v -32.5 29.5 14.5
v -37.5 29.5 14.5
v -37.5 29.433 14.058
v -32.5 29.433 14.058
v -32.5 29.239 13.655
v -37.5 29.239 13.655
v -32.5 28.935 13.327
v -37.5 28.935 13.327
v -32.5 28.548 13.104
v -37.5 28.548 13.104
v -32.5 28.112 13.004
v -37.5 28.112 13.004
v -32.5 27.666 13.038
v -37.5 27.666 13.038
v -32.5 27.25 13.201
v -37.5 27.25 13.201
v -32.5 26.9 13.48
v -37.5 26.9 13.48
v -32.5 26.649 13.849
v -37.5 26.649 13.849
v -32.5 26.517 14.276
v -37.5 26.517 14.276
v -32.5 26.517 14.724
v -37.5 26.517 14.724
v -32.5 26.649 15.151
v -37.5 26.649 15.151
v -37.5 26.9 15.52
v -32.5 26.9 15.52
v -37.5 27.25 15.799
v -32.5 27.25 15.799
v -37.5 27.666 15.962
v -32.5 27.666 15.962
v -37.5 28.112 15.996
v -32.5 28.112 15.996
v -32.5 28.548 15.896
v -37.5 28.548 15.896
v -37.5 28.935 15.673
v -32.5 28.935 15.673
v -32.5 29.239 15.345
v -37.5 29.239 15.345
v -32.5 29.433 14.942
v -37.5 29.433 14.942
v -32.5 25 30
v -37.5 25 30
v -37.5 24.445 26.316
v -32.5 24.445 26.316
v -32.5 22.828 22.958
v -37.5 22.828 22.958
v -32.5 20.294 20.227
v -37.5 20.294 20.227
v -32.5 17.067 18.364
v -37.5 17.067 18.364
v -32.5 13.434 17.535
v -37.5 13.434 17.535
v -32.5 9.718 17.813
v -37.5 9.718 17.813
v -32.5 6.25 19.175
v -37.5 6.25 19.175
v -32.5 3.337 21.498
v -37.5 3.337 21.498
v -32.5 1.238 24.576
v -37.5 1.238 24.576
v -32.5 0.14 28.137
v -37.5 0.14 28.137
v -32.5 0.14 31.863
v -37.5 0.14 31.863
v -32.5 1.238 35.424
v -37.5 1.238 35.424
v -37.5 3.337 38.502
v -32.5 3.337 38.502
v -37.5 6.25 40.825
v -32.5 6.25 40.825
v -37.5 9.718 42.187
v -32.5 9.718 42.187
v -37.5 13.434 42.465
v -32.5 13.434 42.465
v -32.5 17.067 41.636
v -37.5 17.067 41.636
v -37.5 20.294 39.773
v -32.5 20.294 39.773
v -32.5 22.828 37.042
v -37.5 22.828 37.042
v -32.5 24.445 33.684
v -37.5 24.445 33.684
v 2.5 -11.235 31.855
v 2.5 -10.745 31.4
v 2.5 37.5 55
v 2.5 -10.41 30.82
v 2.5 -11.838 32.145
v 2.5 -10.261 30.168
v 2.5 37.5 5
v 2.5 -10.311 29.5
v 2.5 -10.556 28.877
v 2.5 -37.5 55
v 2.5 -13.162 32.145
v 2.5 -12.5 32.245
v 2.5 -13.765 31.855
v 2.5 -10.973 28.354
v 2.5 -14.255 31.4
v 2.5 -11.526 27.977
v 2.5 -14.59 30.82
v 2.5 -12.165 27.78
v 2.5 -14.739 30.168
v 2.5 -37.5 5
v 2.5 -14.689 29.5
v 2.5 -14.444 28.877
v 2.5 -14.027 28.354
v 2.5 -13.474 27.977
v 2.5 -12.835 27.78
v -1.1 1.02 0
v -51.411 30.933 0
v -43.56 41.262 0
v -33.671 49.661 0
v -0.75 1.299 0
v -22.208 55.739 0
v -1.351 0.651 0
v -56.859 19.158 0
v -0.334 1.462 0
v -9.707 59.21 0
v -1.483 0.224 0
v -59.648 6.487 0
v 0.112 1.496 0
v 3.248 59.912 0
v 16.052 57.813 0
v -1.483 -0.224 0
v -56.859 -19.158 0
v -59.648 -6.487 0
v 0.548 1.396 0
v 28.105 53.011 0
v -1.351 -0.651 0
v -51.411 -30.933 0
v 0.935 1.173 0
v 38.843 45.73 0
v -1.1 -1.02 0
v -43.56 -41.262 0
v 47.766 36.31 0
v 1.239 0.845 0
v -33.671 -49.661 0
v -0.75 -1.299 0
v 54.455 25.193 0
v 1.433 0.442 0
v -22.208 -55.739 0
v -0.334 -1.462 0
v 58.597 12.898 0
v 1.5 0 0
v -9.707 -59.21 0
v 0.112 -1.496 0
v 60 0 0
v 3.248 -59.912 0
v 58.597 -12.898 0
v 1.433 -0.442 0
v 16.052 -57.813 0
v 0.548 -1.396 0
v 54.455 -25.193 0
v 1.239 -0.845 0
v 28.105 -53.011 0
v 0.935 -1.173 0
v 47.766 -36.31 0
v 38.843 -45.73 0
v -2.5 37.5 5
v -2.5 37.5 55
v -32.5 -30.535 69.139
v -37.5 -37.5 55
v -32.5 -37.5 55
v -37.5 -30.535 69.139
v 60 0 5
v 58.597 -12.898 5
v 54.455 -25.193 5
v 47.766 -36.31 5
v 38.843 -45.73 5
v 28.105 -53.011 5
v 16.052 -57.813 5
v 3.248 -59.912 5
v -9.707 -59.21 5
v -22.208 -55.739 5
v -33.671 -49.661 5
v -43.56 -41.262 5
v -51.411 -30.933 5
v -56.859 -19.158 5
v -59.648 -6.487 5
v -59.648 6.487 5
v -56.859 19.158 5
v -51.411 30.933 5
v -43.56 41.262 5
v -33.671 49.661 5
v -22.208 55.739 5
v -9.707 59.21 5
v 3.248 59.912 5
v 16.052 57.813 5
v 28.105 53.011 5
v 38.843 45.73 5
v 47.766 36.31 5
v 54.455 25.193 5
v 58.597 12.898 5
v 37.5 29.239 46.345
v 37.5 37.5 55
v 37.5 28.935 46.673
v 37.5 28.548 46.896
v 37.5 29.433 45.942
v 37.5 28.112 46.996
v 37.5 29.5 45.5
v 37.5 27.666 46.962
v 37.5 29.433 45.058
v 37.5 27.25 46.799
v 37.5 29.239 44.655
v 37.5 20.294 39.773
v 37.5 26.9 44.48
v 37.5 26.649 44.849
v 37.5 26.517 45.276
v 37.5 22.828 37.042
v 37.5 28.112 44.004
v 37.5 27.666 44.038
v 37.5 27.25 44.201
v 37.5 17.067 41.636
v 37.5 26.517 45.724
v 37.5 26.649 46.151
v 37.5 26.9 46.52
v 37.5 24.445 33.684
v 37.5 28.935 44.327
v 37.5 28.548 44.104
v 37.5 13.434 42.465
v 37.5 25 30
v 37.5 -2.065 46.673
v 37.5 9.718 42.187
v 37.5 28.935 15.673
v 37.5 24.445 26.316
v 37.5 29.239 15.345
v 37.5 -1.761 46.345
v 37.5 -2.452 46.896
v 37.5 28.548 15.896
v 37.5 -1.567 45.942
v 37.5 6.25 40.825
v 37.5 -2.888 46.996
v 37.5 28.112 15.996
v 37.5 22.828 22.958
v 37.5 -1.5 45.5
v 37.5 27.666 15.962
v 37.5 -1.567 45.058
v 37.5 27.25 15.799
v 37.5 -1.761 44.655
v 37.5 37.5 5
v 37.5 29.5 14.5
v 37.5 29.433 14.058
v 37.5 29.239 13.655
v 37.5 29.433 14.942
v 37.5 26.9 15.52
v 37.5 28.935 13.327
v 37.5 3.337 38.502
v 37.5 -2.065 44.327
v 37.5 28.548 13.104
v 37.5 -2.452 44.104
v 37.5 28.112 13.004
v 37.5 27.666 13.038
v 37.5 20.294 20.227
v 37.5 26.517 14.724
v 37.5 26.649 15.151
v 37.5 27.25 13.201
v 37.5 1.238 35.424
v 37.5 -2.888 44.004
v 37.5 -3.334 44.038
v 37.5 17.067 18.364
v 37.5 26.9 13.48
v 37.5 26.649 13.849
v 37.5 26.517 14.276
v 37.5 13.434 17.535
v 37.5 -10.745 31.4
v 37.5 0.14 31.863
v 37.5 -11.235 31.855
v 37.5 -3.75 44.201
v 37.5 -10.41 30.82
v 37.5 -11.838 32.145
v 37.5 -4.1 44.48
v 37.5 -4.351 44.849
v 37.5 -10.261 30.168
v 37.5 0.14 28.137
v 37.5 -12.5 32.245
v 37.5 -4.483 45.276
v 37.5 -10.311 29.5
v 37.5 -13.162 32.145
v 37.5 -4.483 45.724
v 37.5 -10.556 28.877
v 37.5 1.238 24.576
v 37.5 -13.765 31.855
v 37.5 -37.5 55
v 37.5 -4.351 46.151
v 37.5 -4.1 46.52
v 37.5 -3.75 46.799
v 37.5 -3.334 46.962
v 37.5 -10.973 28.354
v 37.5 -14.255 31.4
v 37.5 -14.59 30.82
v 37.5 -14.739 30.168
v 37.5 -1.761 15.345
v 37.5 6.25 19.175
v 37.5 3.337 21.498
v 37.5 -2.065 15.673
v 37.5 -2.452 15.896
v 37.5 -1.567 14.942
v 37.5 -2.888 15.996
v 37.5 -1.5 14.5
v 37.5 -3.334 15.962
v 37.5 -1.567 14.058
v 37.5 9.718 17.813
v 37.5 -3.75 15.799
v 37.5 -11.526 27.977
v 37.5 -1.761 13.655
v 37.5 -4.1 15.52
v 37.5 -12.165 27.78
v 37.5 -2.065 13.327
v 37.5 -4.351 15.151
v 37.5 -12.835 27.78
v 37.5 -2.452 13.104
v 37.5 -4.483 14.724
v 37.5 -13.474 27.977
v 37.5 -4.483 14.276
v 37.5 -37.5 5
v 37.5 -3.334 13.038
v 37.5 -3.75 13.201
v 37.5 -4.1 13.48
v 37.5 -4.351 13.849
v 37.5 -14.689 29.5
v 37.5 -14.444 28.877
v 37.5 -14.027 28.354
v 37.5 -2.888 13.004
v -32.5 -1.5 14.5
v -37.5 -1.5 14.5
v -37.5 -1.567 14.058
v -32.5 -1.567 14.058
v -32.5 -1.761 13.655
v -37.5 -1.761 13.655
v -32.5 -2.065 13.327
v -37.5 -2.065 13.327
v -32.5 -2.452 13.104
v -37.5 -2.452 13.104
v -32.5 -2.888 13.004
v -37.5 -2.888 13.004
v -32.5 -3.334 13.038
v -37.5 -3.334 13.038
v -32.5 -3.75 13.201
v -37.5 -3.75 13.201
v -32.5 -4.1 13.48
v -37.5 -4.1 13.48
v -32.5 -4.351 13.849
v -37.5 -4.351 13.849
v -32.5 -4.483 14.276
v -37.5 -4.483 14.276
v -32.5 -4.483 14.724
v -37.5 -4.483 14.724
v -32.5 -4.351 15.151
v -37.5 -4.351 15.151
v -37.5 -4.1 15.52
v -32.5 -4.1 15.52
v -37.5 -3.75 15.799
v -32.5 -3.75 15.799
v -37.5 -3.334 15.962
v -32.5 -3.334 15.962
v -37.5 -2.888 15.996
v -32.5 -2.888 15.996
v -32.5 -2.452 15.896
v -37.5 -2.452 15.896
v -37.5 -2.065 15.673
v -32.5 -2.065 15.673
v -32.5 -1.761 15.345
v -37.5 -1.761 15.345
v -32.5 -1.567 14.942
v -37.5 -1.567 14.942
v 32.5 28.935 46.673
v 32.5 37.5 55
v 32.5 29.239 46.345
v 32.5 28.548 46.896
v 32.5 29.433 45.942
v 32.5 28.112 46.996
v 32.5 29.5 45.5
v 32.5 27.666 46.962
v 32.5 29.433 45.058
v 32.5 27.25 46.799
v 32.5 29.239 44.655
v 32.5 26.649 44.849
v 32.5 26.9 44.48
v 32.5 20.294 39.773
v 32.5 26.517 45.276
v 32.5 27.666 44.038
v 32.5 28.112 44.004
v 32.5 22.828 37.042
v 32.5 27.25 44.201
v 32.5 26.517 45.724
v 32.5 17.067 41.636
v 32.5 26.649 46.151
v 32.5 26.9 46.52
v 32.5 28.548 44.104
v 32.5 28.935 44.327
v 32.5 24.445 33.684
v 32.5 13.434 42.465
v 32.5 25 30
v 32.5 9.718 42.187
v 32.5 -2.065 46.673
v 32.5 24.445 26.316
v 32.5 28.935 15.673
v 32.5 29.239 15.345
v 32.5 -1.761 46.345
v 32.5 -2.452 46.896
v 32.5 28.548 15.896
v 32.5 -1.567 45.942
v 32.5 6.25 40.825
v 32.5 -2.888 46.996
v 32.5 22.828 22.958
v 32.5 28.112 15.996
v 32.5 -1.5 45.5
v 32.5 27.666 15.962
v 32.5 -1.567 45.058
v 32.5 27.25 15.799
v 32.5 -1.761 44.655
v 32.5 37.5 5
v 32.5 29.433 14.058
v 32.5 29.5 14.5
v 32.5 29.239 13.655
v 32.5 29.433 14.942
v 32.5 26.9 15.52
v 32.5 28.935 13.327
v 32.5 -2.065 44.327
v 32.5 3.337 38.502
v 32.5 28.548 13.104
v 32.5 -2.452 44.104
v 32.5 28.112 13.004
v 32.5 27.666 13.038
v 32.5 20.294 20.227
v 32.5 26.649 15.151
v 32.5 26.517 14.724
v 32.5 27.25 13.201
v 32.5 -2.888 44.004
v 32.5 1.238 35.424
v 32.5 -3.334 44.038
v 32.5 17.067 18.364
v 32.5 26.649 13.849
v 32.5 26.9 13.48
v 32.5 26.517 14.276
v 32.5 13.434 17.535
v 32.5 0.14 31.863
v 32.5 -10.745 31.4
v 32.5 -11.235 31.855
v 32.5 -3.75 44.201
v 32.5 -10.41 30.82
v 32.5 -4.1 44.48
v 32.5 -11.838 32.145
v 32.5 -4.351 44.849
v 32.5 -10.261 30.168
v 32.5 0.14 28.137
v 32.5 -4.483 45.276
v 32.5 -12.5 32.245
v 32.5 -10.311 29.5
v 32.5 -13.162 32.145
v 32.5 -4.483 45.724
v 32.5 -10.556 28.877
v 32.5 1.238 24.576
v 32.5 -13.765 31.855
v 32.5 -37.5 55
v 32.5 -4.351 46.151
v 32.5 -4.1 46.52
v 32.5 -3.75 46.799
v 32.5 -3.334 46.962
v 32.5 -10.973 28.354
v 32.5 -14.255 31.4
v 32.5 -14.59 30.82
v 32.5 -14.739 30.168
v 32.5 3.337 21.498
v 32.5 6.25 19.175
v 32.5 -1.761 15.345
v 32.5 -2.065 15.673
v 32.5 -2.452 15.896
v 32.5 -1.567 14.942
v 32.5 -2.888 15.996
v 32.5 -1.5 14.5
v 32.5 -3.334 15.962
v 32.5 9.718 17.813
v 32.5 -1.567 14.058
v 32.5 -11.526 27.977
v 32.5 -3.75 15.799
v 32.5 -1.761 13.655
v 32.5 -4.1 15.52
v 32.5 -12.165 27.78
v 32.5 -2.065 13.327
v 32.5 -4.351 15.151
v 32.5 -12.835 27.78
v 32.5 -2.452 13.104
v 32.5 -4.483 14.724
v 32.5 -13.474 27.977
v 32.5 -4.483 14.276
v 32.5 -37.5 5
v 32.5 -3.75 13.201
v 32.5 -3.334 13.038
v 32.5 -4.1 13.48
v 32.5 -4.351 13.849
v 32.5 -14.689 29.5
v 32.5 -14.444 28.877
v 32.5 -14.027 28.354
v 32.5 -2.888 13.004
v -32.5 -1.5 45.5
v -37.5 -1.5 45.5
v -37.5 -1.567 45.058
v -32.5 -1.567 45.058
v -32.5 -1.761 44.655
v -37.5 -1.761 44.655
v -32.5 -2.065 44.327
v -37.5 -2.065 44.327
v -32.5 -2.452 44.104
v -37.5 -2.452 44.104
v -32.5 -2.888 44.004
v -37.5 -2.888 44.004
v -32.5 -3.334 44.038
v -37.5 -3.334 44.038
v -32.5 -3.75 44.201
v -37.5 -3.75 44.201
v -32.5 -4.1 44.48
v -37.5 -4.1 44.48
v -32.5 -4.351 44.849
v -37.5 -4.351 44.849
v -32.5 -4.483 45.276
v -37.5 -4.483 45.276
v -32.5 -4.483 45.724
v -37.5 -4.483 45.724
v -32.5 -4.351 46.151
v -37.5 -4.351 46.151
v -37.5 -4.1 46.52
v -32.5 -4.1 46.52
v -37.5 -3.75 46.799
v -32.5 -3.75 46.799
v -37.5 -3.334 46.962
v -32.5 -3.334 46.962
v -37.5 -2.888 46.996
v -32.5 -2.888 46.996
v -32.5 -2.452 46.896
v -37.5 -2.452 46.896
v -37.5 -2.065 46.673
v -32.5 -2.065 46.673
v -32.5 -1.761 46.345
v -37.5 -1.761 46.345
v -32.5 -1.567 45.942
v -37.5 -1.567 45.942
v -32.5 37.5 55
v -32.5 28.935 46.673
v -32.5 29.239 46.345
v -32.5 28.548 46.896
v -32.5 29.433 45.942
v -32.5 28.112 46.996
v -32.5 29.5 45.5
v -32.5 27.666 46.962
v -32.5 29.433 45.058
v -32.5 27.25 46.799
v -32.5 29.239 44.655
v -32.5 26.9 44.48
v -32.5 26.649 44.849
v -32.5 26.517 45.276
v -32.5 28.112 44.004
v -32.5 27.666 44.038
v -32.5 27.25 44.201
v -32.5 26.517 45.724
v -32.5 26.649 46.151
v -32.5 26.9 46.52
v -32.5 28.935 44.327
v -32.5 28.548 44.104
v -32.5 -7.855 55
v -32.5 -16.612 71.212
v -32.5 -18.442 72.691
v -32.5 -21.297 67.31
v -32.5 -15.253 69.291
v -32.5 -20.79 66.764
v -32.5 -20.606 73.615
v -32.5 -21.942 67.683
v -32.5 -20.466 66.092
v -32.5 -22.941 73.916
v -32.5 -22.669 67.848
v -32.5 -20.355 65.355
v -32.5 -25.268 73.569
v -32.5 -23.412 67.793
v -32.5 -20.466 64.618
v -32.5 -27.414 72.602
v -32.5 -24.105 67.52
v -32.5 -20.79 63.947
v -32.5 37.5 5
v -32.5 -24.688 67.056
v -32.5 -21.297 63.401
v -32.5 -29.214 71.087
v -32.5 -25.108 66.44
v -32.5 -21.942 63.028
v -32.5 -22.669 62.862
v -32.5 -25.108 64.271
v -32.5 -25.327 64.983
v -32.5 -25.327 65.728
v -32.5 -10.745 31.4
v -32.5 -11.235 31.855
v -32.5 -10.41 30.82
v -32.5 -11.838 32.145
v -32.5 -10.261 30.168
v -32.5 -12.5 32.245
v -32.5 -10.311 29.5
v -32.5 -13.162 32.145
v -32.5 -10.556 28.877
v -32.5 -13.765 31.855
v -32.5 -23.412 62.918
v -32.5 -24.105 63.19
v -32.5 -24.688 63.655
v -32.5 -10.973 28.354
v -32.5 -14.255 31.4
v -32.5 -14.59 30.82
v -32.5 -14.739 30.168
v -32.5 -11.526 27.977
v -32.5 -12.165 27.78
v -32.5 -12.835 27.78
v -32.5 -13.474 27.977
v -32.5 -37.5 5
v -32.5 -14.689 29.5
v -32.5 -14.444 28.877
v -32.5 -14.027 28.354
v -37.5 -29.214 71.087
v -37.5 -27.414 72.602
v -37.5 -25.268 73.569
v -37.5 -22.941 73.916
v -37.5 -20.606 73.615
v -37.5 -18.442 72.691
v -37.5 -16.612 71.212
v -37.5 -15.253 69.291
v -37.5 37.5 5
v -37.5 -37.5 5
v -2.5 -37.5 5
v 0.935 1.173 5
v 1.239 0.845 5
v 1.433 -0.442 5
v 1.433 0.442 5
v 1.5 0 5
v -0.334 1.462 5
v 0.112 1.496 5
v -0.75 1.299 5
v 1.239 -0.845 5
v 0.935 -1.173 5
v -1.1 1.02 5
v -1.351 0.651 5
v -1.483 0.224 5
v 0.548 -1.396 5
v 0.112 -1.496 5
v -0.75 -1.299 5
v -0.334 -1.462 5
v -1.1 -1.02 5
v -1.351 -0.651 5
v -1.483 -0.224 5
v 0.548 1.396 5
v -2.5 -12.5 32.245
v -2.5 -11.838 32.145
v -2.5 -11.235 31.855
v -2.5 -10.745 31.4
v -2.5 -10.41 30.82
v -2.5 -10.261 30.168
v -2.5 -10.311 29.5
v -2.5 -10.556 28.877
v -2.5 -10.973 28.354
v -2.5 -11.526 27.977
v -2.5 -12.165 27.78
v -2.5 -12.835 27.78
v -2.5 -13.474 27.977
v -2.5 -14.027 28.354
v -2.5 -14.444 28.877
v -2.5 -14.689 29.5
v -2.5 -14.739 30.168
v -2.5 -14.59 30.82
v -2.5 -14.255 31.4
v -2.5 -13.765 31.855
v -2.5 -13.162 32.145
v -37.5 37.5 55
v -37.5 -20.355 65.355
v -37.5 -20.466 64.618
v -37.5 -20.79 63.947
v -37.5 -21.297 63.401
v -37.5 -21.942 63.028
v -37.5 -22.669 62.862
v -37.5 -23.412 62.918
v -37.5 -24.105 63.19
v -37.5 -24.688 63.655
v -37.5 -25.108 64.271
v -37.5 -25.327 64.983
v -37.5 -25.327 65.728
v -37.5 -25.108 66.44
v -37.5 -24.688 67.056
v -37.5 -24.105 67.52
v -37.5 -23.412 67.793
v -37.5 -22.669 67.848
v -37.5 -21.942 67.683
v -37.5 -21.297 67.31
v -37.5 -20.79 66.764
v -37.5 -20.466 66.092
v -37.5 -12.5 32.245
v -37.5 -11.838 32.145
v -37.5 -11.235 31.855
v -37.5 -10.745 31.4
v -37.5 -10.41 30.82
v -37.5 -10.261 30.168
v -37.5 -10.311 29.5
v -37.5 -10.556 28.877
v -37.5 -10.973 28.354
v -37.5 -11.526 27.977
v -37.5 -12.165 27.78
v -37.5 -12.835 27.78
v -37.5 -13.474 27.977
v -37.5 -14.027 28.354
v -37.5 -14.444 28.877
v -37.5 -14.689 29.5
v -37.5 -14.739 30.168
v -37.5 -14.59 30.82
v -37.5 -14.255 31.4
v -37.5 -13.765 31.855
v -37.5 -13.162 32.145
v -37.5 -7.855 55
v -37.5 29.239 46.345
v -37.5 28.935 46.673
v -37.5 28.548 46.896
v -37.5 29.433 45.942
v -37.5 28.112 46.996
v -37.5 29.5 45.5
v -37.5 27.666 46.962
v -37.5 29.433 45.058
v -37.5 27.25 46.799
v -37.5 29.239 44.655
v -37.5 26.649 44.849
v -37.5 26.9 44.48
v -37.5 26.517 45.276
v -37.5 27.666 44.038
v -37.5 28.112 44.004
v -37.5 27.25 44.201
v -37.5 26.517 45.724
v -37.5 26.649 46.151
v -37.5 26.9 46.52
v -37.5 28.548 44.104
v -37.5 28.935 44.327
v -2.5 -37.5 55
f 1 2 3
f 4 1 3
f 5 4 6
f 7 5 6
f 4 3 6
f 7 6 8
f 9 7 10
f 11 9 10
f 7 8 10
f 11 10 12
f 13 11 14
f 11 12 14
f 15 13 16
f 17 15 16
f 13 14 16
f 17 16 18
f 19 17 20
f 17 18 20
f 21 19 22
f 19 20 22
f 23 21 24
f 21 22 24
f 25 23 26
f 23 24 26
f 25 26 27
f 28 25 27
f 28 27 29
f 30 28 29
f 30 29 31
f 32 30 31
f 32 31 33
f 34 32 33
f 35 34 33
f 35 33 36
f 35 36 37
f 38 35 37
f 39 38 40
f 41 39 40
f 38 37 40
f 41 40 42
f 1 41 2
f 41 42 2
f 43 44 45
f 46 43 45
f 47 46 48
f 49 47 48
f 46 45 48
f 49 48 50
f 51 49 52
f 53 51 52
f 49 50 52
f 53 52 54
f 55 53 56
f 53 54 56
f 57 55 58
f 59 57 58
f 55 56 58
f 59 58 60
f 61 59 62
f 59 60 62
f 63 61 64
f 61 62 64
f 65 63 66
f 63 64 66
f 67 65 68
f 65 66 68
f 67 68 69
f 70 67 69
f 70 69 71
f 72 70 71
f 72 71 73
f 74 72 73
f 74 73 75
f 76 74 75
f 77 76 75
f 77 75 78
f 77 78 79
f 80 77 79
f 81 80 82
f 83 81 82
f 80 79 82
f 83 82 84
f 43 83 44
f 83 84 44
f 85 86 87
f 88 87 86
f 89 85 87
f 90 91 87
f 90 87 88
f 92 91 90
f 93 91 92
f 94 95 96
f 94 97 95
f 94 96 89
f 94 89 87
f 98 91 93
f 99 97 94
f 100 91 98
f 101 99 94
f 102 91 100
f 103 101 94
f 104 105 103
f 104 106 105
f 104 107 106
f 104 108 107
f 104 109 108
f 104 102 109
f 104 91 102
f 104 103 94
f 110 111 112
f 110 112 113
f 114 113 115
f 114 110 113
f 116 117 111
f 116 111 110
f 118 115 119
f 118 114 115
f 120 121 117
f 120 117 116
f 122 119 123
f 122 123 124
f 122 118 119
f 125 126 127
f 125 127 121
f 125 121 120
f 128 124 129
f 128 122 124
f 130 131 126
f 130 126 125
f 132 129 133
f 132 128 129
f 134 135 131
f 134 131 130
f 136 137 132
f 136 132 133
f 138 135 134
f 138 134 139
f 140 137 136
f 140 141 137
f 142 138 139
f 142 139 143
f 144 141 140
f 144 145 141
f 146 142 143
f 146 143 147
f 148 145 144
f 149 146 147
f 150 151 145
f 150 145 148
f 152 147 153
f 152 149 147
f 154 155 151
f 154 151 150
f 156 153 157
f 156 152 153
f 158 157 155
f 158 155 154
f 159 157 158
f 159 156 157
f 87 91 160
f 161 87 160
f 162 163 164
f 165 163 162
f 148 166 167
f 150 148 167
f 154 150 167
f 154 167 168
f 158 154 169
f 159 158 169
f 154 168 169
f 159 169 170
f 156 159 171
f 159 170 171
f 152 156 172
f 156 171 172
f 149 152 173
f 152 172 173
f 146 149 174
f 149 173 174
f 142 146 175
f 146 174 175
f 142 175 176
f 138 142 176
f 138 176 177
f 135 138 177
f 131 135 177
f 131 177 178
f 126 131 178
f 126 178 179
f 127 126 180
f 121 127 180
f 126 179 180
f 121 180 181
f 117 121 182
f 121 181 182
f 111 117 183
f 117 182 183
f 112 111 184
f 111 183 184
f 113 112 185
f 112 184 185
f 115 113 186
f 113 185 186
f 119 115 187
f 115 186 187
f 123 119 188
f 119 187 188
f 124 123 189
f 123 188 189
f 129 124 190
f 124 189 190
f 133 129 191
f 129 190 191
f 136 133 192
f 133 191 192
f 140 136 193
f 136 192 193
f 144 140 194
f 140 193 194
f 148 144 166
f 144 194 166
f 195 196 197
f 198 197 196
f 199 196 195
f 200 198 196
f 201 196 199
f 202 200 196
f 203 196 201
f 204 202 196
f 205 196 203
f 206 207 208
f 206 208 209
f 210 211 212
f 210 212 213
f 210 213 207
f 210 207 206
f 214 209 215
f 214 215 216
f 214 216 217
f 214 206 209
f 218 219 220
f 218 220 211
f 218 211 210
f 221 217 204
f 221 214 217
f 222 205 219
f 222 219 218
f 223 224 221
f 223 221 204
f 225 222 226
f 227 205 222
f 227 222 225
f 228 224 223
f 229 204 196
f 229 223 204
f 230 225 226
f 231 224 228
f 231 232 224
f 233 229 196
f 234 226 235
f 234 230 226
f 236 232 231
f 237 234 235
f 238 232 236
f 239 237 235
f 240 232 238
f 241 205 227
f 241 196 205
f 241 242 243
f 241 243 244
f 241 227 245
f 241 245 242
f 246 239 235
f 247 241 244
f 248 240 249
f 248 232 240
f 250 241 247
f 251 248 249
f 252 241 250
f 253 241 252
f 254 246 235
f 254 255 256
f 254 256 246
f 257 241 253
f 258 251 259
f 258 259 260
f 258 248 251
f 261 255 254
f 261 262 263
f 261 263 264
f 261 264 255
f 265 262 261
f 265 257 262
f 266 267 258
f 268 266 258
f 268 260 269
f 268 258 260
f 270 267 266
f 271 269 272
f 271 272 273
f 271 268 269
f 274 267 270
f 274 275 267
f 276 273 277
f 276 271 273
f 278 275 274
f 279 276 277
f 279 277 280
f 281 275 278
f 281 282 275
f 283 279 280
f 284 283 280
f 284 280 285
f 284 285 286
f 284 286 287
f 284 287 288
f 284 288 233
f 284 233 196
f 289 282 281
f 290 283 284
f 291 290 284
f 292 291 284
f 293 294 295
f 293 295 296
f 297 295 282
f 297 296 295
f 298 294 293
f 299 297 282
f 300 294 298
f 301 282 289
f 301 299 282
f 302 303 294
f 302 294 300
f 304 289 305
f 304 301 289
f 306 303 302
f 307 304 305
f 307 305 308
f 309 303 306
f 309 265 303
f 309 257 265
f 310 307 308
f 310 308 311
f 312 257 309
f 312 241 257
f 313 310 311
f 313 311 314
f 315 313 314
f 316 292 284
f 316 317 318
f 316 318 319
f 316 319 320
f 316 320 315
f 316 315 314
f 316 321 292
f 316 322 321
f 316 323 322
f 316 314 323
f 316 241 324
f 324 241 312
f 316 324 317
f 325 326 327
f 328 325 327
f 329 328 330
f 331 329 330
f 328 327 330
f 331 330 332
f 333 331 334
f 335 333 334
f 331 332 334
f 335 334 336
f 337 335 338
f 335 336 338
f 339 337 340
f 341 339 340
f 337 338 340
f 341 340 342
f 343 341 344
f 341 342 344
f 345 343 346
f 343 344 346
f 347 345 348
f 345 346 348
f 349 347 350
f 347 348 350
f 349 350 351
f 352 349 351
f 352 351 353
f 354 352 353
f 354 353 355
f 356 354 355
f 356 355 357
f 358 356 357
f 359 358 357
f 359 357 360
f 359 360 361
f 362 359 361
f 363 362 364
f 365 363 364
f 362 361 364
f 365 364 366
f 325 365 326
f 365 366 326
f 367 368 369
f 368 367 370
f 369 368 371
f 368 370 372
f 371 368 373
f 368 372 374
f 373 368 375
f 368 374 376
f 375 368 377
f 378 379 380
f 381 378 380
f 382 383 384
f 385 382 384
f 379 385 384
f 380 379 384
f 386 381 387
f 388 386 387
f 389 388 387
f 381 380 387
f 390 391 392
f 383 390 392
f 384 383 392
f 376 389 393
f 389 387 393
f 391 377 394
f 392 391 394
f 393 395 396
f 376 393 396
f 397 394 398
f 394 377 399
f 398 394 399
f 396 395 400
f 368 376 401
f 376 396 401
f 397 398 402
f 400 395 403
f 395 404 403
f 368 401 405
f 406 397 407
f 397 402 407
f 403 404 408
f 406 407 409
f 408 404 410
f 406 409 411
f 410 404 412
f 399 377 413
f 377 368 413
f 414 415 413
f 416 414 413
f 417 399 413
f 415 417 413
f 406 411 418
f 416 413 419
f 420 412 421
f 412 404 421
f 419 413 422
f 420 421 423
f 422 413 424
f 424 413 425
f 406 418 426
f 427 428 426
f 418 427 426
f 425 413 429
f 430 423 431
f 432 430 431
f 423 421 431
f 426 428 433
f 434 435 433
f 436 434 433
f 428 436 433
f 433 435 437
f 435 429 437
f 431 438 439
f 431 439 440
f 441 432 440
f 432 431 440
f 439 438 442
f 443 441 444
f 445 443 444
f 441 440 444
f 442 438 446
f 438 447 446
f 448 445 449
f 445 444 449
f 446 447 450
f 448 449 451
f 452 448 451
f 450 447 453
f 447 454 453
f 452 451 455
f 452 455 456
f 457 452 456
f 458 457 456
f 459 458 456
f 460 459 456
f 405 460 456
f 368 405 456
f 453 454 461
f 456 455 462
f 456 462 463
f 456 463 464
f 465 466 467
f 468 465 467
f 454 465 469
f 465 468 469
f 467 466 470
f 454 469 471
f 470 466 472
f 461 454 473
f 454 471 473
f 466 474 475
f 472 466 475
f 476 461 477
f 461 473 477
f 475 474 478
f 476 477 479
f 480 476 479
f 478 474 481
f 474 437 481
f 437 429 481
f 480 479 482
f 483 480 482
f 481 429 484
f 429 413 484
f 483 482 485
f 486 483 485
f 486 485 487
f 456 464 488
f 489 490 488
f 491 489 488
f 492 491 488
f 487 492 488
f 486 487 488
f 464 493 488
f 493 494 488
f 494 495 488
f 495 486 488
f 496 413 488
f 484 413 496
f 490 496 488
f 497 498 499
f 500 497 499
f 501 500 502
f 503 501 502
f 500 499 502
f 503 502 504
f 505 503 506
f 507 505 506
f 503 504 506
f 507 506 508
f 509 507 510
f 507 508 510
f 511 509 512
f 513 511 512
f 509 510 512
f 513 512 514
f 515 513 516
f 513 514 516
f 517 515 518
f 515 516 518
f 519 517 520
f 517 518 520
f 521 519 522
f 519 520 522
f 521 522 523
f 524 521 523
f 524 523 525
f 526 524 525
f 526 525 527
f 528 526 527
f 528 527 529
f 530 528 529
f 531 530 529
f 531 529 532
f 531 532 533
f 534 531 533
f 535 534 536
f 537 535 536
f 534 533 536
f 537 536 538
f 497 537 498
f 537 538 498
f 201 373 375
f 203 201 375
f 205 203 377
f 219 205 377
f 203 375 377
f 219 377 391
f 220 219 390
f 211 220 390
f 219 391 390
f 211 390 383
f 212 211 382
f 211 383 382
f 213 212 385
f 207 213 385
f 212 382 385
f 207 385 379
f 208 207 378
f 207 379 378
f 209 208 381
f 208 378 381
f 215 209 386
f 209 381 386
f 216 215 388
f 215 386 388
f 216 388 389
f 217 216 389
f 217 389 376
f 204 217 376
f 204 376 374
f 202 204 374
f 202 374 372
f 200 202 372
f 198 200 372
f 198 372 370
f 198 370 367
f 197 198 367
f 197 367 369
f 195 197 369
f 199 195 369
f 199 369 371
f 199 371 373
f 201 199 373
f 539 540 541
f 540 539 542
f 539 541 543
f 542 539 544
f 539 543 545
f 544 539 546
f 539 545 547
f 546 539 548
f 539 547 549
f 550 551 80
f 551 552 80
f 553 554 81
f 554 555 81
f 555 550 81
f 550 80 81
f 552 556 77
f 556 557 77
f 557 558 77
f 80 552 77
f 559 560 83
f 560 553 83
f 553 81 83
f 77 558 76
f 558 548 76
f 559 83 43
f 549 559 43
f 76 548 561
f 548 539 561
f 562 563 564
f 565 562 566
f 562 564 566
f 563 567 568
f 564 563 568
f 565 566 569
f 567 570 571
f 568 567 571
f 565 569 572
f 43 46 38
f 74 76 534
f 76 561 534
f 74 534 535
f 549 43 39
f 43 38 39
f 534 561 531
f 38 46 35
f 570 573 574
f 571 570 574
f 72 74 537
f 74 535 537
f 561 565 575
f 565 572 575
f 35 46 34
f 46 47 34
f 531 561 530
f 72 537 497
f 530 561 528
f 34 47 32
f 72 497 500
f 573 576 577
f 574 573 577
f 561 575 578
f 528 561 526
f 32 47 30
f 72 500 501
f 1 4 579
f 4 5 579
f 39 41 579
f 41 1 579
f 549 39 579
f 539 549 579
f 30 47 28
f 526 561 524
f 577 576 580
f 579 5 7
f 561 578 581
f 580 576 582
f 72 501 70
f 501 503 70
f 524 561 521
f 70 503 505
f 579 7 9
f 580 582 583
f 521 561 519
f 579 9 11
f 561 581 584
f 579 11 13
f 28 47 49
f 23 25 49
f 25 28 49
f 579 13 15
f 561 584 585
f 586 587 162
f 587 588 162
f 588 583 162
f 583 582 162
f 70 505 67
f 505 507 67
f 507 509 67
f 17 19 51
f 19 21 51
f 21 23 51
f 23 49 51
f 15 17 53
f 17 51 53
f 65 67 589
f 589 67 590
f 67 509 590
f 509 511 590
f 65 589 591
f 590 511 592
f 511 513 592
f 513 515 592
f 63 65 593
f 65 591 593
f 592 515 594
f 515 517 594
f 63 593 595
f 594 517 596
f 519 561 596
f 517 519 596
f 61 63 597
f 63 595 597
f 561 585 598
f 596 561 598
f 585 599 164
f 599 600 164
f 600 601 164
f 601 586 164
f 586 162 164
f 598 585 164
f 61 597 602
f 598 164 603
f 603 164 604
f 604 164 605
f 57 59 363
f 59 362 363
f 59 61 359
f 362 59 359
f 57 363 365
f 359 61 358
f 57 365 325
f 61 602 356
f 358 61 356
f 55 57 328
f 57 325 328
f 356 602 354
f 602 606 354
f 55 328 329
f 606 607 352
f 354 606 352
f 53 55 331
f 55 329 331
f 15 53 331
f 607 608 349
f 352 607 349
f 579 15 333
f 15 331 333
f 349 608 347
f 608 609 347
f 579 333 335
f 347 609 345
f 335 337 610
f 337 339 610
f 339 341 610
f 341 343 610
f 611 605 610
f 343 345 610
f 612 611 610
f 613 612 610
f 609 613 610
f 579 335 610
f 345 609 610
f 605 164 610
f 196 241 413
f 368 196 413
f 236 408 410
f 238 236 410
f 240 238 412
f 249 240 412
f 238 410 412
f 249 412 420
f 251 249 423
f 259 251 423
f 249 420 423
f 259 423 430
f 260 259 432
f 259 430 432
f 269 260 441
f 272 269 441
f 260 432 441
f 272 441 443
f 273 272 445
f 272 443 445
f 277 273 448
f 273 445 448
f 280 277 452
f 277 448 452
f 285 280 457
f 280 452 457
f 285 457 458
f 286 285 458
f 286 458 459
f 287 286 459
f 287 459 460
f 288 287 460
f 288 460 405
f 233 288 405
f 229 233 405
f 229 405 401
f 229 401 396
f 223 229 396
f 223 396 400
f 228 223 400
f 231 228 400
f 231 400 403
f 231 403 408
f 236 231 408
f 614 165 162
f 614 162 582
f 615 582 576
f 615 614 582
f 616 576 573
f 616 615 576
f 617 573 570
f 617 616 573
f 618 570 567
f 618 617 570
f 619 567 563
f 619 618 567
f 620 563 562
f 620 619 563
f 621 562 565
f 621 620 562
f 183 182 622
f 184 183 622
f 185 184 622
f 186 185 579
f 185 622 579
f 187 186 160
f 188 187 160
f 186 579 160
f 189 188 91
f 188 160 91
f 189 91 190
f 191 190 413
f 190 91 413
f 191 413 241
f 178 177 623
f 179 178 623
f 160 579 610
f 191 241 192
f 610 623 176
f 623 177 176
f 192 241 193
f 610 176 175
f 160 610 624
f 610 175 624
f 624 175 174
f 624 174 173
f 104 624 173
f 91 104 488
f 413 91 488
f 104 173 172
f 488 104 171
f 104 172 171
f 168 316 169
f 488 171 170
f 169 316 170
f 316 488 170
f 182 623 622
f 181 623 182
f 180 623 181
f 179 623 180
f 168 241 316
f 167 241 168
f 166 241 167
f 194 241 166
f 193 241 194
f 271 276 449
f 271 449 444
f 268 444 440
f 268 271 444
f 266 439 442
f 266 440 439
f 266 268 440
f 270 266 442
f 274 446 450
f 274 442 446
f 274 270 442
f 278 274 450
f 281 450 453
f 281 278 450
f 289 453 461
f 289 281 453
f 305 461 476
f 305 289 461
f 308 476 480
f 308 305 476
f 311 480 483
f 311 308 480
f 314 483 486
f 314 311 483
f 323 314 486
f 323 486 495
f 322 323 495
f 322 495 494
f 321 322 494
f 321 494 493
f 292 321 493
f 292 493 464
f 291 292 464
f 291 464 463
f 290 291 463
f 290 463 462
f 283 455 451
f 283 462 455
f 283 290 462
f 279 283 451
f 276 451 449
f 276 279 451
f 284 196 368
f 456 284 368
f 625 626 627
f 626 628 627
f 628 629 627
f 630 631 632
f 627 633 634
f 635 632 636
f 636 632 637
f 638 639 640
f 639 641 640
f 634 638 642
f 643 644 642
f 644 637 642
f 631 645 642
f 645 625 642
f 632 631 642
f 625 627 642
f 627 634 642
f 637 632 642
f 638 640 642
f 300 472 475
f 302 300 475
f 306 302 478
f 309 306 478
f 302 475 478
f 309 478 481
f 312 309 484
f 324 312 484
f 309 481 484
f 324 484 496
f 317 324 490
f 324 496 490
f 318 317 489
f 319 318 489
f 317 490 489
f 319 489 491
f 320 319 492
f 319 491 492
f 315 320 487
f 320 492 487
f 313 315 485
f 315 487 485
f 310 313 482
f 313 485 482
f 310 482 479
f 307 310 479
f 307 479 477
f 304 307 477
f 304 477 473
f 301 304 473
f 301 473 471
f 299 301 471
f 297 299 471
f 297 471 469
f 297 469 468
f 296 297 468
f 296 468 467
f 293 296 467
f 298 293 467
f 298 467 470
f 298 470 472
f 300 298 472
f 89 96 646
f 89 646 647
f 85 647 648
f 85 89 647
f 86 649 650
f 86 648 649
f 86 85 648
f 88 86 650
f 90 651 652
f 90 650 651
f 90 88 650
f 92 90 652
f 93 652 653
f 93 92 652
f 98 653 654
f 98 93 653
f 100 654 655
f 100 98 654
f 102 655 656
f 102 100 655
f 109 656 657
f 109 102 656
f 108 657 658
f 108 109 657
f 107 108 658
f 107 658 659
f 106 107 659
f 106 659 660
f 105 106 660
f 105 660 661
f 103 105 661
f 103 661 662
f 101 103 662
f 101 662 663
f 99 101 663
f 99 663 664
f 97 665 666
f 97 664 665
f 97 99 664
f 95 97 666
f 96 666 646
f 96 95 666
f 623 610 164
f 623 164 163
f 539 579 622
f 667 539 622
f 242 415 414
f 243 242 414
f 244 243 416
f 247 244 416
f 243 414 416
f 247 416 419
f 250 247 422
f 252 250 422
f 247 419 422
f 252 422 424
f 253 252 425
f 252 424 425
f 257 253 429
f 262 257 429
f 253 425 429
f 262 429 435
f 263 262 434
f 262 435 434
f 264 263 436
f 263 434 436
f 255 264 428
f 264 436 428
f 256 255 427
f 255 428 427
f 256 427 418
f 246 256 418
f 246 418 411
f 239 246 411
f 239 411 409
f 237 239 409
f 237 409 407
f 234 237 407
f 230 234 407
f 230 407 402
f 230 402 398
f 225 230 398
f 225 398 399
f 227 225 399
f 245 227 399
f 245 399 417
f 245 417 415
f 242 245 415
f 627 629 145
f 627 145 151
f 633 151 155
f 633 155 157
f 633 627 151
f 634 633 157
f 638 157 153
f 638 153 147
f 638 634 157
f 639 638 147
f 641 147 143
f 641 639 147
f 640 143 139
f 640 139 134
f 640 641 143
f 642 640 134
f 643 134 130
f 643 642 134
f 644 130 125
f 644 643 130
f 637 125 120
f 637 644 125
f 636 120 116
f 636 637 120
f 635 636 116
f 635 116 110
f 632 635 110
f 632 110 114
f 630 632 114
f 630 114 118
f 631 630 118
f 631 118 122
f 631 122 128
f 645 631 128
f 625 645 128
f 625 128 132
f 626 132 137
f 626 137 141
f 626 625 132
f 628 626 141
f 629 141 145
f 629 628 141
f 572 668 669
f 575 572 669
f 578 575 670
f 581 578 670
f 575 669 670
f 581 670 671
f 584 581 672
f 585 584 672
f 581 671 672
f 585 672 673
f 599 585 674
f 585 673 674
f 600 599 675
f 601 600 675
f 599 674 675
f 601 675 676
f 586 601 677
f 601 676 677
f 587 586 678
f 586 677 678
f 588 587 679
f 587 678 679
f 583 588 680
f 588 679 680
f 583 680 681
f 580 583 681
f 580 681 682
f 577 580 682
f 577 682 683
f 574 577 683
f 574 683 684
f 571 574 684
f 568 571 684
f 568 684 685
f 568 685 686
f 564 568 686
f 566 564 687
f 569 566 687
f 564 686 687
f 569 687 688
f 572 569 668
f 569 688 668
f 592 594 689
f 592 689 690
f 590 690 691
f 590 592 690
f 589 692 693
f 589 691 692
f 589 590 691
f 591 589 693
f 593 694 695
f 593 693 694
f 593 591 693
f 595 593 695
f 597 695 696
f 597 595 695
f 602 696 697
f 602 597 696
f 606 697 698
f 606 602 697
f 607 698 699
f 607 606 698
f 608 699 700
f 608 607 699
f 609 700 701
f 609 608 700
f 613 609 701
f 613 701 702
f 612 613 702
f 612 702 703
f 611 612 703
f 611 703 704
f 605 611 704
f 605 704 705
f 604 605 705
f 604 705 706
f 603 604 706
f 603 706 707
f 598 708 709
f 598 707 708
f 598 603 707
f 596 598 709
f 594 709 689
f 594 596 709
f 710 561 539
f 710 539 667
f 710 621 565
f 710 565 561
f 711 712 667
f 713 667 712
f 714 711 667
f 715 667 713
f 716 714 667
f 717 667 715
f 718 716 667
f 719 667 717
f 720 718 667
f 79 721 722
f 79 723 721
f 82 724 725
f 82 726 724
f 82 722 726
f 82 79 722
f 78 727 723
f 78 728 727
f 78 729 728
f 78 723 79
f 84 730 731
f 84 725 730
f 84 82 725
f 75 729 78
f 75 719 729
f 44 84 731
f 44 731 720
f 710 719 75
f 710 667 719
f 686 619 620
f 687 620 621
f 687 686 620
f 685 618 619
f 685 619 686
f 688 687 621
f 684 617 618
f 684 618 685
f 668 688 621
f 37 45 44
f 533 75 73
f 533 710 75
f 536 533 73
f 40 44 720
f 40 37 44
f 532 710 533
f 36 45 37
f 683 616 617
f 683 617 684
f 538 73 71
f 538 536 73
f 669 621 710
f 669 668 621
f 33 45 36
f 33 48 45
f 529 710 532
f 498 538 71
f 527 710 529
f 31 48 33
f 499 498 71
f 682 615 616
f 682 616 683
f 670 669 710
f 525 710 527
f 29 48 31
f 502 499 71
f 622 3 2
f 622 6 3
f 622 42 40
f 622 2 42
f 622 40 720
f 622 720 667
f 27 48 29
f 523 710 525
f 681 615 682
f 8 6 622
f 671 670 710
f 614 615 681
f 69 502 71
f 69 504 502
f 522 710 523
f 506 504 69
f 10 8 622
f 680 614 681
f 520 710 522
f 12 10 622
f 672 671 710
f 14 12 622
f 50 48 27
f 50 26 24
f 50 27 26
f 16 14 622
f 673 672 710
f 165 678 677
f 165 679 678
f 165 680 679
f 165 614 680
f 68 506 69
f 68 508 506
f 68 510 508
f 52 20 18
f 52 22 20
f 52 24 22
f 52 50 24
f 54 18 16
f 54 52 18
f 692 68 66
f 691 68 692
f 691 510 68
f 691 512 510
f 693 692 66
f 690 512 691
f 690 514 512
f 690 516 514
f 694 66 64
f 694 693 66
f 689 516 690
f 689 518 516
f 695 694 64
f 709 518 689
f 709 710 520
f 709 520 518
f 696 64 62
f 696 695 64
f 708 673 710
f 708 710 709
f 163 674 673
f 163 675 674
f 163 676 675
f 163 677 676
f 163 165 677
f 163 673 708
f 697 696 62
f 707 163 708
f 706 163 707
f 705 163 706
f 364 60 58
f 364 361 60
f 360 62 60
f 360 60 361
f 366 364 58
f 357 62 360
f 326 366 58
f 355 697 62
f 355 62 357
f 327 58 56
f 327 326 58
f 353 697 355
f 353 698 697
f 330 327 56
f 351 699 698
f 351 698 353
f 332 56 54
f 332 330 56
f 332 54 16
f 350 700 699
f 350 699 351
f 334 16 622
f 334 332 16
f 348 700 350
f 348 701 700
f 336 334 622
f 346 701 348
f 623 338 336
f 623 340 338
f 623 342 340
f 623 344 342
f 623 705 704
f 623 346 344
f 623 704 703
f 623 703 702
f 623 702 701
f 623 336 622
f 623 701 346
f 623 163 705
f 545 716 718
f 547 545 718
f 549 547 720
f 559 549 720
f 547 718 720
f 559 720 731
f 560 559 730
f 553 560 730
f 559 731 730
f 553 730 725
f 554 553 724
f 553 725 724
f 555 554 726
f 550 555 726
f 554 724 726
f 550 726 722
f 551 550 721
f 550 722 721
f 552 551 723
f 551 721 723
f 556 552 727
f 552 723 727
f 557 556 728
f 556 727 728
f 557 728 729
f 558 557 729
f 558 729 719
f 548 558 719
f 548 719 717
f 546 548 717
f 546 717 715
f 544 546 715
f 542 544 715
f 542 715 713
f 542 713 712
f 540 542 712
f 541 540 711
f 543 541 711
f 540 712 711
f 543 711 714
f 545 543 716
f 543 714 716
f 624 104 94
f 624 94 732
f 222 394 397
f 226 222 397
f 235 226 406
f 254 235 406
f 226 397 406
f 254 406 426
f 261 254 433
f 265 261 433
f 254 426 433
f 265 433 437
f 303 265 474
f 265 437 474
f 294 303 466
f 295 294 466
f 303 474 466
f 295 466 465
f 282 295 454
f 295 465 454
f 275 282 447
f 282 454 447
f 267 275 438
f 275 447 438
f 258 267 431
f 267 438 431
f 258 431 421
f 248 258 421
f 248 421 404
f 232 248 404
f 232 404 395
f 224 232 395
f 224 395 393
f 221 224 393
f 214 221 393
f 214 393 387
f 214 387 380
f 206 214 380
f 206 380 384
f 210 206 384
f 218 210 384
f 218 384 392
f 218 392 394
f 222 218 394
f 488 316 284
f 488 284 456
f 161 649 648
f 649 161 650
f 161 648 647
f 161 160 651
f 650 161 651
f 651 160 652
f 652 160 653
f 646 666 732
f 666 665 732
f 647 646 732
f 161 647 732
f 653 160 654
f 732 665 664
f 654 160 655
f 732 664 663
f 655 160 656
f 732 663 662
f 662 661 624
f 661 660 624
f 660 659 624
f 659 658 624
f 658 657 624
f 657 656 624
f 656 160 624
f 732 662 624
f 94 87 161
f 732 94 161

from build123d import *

# Parameters (mm, degrees)
SKETCH1_R               = 60
SKETCH1_R_2             = 1.5
BOSS_EXTRUDE1_DEPTH     = 5
SKETCH2_W               = 5
SKETCH2_H               = 75
BOSS_EXTRUDE2_DEPTH     = 50
SKETCH3_R               = 1.5
SKETCH3_R_2             = 12.5
CUT_EXTRUDE1_DEPTH      = 122.063000128
CUT_EXTRUDE4_DEPTH      = 101.031245119
CUT_EXTRUDE4_DEPTH_BACK = 53
SKETCH5_R               = 2.24506403
SKETCH6_R               = 1.5
SKETCH6_R_2             = 12.5
CUT_EXTRUDE5_DEPTH      = 5
SKETCH7_R               = 2.5
BOSS_EXTRUDE4_DEPTH     = 5
BODY_MOVE_COPY1_ANGLE   = 180


with BuildPart() as part:
    # Sketch1 → Boss-Extrude1 (new body)
    with BuildSketch(Plane.XY):
        Circle(SKETCH1_R)
        Circle(SKETCH1_R_2, mode=Mode.SUBTRACT)
    extrude(amount=BOSS_EXTRUDE1_DEPTH)

    # Sketch2 → Boss-Extrude2 (add)
    with BuildSketch(Plane(origin=(0, 0, 0), x_dir=(-1, 0, 0), z_dir=(0, 0, -1))):
        with Locations((-35, 0)):
            Rectangle(SKETCH2_W, SKETCH2_H)
        with Locations((35, 0)):
            Rectangle(SKETCH2_W, SKETCH2_H)
        Rectangle(SKETCH2_W, SKETCH2_H)
    extrude(amount=BOSS_EXTRUDE2_DEPTH)

    # Sketch3 → Cut-Extrude1 (cut, through all)
    with BuildSketch(Plane.ZY.offset(-32.5)):
        with Locations(Location((-40.5, 3, 0), (0, 0, 270))):
            Circle(SKETCH3_R)
        with Locations(Location((-9.5, 3, 0), (0, 0, 270))):
            Circle(SKETCH3_R)
        with Locations(Location((-9.5, -28, 0), (0, 0, 270))):
            Circle(SKETCH3_R)
        with Locations(Location((-40.5, -28, 0), (0, 0, 270))):
            Circle(SKETCH3_R)
        with Locations(Location((-25, -12.5, 0), (0, 0, 270))):
            Circle(SKETCH3_R_2)
    extrude(amount=-CUT_EXTRUDE1_DEPTH, mode=Mode.SUBTRACT)

    # Sketch5 → Cut-Extrude4 (cut, two sides: drawn at the far end of the back side and taken through both)
    with BuildSketch(Plane.ZY.offset(2.5).offset(-CUT_EXTRUDE4_DEPTH_BACK)):
        with Locations(Location((-25, 12.5, 0), (0, 0, 180))):
            Circle(SKETCH5_R)
    extrude(amount=CUT_EXTRUDE4_DEPTH + CUT_EXTRUDE4_DEPTH_BACK, mode=Mode.SUBTRACT)

    # Sketch6 → Cut-Extrude5 (cut)
    with BuildSketch(Plane.ZY.offset(37.5)):
        with Locations(Location((-40.5, 3, 0), (0, 0, 270))):
            Circle(SKETCH6_R)
        with Locations(Location((-9.5, 3, 0), (0, 0, 270))):
            Circle(SKETCH6_R)
        with Locations(Location((-9.5, -28, 0), (0, 0, 270))):
            Circle(SKETCH6_R)
        with Locations(Location((-40.5, -28, 0), (0, 0, 270))):
            Circle(SKETCH6_R)
        with Locations(Location((-25, -12.5, 0), (0, 0, 270))):
            Circle(SKETCH6_R_2)
    extrude(amount=-CUT_EXTRUDE5_DEPTH, mode=Mode.SUBTRACT)

    # Sketch7 → Boss-Extrude4 (add)
    with BuildSketch(Plane.ZY.offset(37.5)):
        with BuildLine():
            Line((-50, 37.5), (-64.138546099, 30.534707883))
            ThreePointArc((-64.138546099, 30.534707883), (-68.91560159, 22.940582469), (-64.290723579, 15.252832254))
            Line((-64.290723579, 15.252832254), (-50, 7.855339059))
            Line((-50, 7.855339059), (-50, 37.5))
        make_face()
        with Locations(Location((-60.355339059, 22.855339059, 0), (0, 0, 270))):
            Circle(SKETCH7_R, mode=Mode.SUBTRACT)
    extrude(amount=-BOSS_EXTRUDE4_DEPTH)


with BuildPart() as part_1:
    # Body-Move/Copy1: moved
    add(part.part.rotate(Axis((0, 0, -31.958013004), (1, 0, 0)), BODY_MOVE_COPY1_ANGLE))


with BuildPart() as part_2:
    # Body-Move/Copy2: moved
    add(part_1.part.moved(Location((0, 0, 68.91602601))))


solid = part_2.part
